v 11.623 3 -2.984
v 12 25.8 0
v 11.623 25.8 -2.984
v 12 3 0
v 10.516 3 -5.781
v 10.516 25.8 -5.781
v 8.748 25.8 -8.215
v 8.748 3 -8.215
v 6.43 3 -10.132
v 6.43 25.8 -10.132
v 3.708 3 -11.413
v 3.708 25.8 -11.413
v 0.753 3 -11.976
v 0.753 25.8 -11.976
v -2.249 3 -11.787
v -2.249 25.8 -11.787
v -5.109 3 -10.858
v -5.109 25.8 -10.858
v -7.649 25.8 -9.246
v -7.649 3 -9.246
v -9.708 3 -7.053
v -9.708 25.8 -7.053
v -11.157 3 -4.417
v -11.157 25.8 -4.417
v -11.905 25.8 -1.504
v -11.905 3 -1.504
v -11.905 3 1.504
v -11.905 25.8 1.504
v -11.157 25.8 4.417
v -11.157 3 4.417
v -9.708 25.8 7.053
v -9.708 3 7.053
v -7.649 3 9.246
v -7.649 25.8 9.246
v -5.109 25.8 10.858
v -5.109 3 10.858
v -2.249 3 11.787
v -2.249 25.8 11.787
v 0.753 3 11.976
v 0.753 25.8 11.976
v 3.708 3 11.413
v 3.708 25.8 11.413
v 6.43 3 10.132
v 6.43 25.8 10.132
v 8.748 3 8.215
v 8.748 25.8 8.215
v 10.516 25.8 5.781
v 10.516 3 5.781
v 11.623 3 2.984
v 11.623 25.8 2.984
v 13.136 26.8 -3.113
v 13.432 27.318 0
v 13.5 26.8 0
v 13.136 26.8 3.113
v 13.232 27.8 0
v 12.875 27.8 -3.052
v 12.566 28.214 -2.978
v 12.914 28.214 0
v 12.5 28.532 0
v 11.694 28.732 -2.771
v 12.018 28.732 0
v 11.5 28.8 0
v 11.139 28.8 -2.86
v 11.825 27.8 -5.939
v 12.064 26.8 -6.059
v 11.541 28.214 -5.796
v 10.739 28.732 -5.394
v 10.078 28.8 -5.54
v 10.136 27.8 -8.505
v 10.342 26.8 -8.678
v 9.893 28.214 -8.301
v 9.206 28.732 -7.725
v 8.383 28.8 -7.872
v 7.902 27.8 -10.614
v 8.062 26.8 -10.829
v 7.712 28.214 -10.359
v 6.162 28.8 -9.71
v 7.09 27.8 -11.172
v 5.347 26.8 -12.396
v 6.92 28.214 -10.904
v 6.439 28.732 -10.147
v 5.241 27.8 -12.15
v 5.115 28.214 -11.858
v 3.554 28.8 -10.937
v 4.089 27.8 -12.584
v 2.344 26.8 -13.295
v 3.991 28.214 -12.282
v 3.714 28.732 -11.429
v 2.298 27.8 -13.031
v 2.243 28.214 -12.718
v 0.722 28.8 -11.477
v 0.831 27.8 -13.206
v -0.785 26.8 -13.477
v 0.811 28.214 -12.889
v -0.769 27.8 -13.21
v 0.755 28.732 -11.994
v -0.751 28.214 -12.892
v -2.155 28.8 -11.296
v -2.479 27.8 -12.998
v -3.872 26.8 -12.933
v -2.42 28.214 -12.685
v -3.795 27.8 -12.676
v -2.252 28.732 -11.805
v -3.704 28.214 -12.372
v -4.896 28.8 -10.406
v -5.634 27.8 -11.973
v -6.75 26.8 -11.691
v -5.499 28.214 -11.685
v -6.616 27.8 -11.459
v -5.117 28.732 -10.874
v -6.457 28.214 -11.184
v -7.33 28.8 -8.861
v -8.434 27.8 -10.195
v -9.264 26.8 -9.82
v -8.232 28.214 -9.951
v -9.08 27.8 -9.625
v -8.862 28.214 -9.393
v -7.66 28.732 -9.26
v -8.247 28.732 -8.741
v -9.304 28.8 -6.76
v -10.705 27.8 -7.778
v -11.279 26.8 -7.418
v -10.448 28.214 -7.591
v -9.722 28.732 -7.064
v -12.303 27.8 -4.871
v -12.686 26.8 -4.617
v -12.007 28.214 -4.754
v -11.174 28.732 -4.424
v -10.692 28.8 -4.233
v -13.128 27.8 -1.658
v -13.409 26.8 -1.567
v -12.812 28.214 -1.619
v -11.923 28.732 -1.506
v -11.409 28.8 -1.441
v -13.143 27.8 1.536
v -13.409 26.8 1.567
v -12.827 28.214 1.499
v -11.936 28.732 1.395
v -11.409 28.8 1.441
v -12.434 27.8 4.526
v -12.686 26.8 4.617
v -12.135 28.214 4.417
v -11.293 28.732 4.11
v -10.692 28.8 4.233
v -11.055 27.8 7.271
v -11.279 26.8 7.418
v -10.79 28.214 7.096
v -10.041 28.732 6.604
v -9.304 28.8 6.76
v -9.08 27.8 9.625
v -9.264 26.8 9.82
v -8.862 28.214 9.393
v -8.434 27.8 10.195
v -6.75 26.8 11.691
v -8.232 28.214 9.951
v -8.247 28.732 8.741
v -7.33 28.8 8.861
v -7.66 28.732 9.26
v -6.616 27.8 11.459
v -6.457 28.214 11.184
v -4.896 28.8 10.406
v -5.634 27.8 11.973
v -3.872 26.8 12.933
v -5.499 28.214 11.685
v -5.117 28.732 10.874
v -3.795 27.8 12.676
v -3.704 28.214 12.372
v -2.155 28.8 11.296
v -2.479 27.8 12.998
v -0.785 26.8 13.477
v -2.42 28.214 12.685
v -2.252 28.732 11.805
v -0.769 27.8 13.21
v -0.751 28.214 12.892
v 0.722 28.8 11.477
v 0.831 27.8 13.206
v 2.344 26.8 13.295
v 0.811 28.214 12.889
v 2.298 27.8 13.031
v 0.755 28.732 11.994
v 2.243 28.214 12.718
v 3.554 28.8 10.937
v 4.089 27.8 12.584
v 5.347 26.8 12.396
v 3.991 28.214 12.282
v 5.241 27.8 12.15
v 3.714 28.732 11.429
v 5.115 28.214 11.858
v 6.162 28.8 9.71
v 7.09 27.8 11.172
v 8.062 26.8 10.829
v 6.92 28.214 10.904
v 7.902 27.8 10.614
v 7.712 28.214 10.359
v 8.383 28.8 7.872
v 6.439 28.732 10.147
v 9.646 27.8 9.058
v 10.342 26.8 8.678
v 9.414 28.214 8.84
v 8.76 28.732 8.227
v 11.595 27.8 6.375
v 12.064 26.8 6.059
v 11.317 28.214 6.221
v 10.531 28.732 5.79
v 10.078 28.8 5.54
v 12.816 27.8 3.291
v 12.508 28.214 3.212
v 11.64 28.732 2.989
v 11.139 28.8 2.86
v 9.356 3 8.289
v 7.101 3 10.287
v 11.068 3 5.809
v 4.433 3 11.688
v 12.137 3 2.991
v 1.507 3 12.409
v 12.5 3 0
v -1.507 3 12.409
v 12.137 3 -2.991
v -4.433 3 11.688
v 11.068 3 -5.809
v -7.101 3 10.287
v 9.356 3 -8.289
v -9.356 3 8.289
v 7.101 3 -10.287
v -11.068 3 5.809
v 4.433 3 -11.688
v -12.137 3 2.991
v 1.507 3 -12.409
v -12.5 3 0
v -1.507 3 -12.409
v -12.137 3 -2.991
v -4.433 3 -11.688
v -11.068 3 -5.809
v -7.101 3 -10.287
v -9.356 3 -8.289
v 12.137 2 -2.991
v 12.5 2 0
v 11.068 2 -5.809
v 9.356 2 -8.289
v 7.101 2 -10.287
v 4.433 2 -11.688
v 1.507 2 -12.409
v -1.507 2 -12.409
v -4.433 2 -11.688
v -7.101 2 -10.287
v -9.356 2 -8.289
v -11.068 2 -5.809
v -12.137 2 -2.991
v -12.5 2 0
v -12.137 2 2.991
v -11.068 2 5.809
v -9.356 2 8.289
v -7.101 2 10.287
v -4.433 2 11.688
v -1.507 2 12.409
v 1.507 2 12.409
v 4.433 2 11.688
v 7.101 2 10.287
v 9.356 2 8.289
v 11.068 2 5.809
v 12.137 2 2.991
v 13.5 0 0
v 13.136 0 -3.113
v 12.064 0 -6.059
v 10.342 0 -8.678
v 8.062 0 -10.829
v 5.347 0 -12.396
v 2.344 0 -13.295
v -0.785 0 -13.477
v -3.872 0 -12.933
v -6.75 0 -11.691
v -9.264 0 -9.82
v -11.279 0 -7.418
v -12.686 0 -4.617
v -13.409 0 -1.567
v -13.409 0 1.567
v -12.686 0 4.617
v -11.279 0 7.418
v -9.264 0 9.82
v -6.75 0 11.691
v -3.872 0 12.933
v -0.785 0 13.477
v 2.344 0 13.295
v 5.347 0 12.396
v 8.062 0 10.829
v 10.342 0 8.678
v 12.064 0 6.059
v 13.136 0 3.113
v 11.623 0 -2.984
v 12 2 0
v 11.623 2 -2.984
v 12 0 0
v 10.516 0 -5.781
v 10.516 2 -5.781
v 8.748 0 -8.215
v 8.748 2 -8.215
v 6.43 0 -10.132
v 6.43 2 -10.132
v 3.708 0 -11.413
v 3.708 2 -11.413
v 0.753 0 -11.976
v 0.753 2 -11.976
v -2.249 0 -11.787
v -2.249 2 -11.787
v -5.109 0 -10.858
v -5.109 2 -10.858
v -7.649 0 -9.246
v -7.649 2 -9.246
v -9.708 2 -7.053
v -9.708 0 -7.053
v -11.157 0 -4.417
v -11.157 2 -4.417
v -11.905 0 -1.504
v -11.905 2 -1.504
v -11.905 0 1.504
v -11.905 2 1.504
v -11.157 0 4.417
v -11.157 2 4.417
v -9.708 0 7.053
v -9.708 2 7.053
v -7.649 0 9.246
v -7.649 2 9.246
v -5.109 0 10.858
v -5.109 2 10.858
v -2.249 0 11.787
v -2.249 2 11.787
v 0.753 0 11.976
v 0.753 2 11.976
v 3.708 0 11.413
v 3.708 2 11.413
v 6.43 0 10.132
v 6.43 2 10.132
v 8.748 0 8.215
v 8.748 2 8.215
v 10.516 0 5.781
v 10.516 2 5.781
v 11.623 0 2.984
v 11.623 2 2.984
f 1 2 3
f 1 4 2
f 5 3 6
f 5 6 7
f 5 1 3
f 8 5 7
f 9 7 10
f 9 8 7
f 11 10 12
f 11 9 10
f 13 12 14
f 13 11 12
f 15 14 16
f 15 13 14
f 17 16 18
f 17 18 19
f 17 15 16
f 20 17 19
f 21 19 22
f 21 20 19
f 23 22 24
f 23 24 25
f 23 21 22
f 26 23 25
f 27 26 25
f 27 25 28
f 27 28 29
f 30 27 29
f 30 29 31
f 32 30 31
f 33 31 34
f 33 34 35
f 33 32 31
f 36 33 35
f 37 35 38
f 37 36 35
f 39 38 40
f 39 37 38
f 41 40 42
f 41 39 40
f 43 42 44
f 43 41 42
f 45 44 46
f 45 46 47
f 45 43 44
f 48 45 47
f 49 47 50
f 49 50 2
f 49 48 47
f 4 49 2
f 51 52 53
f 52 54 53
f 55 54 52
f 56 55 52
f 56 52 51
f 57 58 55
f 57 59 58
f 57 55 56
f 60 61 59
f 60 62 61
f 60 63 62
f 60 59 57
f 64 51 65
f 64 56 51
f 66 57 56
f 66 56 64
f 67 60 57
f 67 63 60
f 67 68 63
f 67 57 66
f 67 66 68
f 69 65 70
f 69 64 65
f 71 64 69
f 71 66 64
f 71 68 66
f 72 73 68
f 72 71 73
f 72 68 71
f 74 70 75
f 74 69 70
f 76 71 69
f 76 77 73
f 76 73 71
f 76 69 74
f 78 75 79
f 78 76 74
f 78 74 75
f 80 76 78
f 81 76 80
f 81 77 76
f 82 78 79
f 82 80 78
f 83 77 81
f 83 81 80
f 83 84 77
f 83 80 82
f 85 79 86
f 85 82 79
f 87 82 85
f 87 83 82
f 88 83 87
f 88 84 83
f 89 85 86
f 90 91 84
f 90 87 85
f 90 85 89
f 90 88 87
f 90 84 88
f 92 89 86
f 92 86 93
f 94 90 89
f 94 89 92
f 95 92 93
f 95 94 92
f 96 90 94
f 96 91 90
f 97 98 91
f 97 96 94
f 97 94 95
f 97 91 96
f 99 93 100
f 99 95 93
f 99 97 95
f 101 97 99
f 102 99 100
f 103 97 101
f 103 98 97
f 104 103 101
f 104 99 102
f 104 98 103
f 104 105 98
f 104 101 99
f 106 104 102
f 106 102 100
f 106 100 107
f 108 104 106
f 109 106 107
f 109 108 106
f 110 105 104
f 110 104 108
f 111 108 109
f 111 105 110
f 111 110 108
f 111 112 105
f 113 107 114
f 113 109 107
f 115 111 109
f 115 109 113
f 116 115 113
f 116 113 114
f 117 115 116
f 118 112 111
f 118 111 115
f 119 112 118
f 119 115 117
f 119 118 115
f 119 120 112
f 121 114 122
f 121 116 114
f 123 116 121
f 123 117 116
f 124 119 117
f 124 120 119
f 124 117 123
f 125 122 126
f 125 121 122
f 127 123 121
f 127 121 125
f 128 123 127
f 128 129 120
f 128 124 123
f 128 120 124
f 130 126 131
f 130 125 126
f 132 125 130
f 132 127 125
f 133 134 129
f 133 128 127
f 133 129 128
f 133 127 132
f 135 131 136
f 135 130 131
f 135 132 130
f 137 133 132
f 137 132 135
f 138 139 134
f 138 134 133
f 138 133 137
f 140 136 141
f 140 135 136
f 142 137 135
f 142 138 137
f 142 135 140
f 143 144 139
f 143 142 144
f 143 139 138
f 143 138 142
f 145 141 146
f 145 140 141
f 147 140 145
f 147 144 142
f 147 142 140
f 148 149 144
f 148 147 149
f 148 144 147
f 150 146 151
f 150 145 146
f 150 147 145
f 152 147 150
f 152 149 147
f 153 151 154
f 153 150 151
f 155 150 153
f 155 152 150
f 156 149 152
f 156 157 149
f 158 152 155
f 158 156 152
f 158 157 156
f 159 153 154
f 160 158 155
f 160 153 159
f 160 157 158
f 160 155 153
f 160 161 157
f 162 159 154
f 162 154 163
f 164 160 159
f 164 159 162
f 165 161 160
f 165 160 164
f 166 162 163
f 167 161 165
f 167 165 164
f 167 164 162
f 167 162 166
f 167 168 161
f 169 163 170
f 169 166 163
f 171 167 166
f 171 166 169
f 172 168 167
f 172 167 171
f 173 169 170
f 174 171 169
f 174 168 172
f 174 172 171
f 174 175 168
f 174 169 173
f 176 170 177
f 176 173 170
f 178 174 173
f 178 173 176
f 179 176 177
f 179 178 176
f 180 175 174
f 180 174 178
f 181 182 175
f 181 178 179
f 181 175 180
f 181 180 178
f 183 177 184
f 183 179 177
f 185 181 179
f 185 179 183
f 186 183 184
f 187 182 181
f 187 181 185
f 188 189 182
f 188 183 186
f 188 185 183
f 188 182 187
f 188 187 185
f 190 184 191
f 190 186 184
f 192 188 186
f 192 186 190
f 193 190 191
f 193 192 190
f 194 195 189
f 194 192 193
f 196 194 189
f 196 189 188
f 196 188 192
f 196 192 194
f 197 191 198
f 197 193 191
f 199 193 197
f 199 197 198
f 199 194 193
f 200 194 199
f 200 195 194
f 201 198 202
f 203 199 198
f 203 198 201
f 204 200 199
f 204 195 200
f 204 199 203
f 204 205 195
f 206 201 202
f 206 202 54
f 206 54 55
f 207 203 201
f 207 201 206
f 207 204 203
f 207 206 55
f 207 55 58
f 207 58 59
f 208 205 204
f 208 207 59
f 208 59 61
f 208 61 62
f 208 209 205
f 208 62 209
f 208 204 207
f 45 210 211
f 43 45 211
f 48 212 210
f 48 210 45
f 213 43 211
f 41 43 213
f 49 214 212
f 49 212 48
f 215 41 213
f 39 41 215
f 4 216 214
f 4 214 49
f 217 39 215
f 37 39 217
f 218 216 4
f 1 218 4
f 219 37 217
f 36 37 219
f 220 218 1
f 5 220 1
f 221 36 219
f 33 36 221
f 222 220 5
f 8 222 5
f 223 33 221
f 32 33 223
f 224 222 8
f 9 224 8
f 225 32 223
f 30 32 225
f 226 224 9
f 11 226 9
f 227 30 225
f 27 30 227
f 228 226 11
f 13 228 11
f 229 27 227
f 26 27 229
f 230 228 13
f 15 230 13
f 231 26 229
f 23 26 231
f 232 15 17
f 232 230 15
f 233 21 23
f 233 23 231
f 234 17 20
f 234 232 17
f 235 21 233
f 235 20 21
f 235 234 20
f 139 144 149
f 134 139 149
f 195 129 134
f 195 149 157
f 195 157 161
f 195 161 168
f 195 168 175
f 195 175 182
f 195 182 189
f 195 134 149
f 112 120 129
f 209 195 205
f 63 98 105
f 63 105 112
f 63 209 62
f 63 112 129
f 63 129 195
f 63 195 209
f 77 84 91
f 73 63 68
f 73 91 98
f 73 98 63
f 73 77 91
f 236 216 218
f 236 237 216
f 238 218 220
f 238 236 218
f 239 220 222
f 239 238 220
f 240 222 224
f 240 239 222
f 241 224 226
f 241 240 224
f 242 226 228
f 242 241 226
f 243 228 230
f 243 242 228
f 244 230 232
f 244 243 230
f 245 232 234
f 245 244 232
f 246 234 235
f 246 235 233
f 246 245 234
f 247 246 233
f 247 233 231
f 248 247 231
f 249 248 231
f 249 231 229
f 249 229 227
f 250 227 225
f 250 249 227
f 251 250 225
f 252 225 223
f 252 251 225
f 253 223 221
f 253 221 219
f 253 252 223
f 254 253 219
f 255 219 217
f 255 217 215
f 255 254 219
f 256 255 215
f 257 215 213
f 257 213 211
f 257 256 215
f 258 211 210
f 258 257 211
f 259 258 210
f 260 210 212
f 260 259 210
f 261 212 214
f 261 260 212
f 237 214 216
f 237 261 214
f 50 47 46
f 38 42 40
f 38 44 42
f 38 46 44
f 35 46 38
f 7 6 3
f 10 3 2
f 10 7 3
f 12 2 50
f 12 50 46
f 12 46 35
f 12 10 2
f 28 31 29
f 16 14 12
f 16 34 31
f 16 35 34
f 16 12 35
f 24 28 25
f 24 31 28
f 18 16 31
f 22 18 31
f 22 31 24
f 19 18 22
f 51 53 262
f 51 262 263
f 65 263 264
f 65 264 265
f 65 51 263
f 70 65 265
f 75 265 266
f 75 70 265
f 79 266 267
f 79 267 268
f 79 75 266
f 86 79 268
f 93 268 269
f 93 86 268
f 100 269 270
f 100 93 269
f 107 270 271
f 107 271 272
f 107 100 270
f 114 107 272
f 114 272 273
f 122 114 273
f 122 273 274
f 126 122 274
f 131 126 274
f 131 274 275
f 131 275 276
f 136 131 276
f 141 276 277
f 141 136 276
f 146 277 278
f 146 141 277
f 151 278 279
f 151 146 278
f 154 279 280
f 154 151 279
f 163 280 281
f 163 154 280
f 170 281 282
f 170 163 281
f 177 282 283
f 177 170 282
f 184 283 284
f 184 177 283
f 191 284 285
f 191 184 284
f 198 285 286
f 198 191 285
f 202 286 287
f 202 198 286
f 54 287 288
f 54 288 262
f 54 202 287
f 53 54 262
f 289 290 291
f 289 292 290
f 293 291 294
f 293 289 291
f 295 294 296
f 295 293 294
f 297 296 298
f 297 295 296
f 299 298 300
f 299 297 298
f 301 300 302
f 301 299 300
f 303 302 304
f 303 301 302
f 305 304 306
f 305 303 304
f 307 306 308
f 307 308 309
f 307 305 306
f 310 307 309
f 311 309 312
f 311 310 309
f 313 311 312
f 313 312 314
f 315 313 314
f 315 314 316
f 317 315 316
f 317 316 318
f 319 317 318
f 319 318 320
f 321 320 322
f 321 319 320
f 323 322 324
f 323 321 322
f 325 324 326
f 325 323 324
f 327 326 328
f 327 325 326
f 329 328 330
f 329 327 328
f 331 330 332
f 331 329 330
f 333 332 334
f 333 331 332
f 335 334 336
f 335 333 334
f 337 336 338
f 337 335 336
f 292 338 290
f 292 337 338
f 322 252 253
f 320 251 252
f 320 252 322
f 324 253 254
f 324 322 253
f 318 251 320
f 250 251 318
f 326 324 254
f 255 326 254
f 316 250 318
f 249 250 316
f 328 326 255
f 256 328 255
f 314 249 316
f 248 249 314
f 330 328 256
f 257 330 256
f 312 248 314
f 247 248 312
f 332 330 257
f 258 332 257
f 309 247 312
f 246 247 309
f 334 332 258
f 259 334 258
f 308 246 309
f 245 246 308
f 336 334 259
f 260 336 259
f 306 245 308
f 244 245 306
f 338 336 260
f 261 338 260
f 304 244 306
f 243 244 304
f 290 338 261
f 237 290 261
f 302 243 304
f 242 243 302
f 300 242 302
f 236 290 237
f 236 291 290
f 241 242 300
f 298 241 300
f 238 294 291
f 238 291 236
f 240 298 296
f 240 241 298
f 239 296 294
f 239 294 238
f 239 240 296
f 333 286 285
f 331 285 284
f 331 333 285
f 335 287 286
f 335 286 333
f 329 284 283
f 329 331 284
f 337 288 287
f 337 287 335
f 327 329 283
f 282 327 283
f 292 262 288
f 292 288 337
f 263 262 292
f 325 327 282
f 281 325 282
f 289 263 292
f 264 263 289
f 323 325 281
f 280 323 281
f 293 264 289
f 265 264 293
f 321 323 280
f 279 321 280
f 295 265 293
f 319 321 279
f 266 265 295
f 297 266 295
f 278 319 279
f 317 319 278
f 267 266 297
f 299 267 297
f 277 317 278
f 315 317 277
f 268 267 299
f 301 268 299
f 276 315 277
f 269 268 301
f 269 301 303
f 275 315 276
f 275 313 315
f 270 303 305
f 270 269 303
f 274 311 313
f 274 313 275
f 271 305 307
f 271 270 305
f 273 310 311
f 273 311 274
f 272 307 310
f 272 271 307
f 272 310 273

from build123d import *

# Parameters (mm, degrees)
CONG_1_R = 2


with BuildPart() as part:
    # Esquisse1 → Révolution1 (revolve)
    with BuildSketch(Plane.XY, mode=Mode.PRIVATE) as r_volution1_sk:
        Polygon((-13.5, 0), (-13.5, 28.8), (0, 28.8), (0, 25.8), (-12, 25.8), (-12, 3), (-12.5, 3), (-12.5, 2), (-12, 2), (-12, 0), align=None)
    revolve(r_volution1_sk.sketch.rotate(Axis((0, 0, 0), (0, 1, 0)), 180), axis=Axis((0, 0, 0), (0, 1, 0)))

    # Congé1
    cong_1_edges = [part.edges().sort_by_distance(p)[0] for p in [
        (-13.5, 28.8, 0),
    ]]
    fillet(cong_1_edges, radius=CONG_1_R)


solid = part.part
